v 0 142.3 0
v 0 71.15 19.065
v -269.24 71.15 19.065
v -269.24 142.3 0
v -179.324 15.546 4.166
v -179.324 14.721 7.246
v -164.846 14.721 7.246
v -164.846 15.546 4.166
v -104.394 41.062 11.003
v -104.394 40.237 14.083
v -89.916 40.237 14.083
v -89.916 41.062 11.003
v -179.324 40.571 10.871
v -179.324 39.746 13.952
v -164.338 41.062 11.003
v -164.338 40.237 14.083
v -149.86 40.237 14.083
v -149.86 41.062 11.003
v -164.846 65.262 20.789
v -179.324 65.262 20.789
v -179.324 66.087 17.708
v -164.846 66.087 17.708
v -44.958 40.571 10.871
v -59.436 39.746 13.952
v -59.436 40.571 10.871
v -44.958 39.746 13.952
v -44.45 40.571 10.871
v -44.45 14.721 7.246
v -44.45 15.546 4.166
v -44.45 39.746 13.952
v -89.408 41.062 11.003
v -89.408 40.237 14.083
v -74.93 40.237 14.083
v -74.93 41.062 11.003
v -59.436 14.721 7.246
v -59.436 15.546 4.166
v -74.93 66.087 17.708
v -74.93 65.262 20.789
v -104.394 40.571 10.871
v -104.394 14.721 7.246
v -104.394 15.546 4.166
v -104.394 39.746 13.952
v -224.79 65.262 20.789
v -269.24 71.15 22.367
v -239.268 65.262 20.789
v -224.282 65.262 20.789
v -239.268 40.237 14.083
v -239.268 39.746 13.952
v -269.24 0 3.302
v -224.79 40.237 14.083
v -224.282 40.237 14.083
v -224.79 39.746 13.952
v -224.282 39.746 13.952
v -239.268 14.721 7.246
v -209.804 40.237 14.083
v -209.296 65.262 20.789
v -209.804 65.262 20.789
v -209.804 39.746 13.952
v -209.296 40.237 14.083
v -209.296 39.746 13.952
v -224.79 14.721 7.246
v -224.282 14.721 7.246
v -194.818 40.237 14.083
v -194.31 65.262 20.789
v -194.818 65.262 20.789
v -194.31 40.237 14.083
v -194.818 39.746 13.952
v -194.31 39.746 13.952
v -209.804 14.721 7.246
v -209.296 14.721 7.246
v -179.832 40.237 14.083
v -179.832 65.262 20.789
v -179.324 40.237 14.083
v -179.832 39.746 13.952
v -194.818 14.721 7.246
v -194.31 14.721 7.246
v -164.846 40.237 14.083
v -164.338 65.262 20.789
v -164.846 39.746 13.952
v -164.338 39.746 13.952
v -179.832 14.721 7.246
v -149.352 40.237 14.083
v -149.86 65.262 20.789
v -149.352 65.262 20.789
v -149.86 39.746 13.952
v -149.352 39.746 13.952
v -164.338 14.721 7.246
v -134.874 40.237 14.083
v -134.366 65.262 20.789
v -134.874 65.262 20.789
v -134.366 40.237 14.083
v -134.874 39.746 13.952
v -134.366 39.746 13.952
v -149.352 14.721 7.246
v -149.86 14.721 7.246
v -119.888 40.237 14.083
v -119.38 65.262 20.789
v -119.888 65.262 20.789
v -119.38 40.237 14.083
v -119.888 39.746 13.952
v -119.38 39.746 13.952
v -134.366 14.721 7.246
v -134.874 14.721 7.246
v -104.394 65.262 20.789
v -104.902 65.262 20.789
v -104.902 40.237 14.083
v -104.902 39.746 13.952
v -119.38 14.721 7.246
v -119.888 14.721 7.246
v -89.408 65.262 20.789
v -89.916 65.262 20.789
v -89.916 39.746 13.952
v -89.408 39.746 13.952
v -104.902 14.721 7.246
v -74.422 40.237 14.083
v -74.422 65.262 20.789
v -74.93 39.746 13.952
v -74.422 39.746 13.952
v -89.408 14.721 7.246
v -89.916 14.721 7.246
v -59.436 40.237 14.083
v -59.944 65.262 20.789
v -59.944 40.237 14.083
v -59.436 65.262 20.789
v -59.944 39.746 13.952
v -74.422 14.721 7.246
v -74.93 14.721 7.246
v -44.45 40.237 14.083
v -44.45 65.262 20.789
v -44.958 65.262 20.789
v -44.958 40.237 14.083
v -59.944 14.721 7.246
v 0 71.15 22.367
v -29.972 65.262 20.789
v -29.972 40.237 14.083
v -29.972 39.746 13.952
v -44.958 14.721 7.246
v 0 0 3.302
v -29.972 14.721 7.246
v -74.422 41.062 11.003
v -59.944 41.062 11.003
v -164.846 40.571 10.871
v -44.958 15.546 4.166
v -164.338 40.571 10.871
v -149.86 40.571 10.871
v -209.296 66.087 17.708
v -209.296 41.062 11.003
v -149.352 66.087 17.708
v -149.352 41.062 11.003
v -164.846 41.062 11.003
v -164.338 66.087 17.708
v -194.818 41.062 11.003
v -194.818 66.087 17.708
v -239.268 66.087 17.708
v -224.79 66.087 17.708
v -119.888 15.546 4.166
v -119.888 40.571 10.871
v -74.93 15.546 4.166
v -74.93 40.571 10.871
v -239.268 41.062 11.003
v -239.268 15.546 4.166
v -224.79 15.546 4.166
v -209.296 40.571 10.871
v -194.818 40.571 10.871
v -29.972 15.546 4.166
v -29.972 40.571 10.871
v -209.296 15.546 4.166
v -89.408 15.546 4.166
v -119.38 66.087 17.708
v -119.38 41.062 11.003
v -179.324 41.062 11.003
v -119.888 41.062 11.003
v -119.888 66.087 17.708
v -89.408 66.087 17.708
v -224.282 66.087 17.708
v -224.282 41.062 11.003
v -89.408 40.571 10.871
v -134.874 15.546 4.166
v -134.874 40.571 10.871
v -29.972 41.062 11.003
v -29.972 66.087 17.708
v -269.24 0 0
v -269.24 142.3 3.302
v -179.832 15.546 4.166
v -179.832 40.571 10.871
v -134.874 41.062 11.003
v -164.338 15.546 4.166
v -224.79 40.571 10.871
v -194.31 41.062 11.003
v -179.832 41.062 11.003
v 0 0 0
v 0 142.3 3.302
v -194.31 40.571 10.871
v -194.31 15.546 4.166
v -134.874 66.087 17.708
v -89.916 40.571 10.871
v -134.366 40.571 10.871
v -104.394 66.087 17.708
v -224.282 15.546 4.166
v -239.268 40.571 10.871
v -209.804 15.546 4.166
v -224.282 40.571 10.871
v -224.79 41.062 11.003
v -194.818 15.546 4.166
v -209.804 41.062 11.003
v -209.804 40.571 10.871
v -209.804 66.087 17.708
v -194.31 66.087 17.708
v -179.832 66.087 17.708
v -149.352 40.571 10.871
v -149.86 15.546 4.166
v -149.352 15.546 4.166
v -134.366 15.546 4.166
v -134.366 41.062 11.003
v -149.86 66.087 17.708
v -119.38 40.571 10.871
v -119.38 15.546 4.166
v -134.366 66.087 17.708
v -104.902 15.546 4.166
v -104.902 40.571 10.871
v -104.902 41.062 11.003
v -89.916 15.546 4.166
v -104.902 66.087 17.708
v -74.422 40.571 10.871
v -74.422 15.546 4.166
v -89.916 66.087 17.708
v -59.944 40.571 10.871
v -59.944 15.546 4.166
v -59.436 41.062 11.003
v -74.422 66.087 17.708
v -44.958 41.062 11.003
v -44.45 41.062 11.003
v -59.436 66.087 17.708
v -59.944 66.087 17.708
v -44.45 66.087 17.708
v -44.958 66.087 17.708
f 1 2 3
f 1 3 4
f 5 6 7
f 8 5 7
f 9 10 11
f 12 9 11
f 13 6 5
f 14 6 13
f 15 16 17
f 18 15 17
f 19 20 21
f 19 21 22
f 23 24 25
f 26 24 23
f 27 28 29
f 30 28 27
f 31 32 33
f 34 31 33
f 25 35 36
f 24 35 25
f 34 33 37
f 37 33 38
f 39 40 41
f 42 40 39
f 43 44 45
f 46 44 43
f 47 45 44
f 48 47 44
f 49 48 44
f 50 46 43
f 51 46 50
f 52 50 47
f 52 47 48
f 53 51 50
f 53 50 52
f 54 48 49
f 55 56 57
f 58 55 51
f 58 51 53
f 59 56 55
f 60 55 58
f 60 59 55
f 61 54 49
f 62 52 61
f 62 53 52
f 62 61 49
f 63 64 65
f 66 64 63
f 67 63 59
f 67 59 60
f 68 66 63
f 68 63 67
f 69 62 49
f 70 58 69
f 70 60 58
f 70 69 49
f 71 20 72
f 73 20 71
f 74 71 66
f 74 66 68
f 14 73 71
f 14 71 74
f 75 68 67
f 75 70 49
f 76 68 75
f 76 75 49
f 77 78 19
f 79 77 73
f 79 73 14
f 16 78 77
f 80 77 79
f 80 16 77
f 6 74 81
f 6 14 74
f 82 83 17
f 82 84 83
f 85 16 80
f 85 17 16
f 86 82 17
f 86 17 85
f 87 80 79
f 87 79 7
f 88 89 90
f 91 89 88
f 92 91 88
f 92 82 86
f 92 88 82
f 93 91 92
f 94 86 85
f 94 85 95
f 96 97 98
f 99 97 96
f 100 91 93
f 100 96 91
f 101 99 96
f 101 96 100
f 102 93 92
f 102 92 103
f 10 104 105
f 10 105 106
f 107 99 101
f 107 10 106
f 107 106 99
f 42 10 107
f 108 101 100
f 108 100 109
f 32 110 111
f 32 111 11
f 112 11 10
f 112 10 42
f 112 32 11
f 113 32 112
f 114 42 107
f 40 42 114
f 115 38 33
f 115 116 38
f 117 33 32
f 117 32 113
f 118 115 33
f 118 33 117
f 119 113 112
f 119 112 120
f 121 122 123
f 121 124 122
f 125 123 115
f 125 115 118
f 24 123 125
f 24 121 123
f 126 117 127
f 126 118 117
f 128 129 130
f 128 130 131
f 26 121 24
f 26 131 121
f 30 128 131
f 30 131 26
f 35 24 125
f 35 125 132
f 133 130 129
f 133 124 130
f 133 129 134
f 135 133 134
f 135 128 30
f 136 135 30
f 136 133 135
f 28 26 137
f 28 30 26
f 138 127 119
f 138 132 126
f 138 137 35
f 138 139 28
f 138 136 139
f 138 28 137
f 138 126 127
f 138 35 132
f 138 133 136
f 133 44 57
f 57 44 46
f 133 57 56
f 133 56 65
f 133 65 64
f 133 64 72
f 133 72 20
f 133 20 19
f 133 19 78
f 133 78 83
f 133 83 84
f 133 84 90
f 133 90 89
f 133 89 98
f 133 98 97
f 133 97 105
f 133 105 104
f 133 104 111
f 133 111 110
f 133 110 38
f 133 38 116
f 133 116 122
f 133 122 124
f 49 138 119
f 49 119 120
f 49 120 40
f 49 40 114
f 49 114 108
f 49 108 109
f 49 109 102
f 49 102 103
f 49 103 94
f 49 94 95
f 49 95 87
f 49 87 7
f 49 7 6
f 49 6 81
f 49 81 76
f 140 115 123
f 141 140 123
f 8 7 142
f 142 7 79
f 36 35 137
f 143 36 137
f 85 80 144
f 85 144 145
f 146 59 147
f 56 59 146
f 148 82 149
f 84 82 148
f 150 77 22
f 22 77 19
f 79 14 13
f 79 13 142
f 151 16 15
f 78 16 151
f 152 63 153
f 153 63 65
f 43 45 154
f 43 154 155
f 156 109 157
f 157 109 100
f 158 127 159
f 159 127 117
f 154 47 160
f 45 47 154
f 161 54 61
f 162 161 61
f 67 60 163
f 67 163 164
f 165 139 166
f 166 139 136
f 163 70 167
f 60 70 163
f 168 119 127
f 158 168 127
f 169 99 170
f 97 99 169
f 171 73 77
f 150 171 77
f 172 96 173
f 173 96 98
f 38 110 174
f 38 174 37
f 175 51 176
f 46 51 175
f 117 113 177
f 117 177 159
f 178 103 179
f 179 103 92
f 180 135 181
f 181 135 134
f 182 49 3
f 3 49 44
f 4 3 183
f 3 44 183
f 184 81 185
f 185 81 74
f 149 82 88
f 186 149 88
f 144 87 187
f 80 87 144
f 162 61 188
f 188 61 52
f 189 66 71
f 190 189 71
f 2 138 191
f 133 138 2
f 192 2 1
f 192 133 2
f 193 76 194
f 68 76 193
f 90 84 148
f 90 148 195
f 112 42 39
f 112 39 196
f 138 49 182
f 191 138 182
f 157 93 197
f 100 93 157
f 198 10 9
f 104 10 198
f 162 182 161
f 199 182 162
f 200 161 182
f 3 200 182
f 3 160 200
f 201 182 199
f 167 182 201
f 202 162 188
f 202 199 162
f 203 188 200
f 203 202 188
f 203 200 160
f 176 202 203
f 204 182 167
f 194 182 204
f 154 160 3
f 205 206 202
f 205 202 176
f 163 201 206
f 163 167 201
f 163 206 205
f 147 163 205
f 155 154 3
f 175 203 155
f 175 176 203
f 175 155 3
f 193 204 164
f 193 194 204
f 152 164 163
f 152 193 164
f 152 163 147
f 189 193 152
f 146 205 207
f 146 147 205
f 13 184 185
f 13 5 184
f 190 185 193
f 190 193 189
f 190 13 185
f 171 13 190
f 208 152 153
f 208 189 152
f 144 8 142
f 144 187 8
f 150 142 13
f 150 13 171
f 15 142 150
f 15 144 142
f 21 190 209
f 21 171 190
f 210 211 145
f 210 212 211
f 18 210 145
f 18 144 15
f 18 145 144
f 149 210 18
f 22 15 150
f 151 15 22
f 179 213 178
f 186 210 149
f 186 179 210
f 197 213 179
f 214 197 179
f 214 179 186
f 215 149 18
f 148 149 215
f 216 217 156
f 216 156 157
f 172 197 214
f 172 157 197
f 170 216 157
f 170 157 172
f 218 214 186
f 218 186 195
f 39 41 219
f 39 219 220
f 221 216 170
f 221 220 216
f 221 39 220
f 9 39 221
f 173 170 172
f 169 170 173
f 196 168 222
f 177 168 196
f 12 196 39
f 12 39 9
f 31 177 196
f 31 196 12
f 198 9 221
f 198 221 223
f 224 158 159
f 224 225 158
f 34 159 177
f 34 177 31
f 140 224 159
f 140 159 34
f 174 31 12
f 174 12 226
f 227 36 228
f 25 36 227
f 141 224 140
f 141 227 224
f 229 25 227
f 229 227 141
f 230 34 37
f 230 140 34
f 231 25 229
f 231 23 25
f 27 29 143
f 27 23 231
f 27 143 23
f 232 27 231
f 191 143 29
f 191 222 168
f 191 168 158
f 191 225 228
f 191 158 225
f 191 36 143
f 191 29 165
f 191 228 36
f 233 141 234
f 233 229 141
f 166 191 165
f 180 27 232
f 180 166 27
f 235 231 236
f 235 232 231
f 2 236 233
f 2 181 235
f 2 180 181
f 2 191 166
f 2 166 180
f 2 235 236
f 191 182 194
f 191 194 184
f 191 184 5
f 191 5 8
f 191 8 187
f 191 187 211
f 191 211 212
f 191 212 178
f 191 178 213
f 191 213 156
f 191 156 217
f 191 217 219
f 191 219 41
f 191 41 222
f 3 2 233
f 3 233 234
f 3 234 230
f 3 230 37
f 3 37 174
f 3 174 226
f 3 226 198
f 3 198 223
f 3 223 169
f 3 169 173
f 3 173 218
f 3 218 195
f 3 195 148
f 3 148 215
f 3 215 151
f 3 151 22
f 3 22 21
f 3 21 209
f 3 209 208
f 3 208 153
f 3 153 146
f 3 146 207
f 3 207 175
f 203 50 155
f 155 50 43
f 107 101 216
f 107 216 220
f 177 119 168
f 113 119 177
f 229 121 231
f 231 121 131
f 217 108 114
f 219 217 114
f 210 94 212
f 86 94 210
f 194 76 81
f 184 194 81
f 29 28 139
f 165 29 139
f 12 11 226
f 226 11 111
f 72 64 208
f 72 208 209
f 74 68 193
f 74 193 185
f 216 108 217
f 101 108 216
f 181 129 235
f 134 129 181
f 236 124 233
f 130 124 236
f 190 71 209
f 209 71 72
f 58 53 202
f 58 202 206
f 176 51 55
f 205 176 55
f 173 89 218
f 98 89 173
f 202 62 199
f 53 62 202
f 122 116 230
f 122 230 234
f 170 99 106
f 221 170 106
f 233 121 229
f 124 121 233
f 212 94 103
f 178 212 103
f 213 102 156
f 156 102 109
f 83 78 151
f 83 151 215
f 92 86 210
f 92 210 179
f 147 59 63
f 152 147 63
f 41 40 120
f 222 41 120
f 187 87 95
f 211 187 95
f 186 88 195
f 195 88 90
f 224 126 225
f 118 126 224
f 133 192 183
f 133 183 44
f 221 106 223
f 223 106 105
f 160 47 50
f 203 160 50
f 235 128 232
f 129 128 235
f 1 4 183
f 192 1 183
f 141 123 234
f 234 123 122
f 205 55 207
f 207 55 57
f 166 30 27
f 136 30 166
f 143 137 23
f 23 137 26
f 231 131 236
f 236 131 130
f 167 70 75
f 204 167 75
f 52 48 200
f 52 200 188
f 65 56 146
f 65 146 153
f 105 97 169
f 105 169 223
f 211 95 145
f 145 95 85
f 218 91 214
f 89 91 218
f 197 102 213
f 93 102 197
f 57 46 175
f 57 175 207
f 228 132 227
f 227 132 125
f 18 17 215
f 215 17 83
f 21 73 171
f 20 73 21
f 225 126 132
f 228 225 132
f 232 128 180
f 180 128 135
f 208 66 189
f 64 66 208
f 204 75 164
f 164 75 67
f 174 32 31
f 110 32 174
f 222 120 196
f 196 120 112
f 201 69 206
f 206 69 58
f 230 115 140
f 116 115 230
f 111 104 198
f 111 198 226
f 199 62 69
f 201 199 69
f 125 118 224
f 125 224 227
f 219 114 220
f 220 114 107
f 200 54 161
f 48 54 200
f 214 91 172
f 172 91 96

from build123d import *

# Parameters (mm, degrees)
F1_DEPTH = 269.24
F2_W     = 14.478
F2_H     = 25.908
F3_DEPTH = 25.4


with BuildPart() as f1:
    # F0 (on Right) → F1 (new body)
    with BuildSketch(Plane.YZ):
        Polygon((0, 3.302), (0, 0), (71.1500963645, 19.0646108623), (142.3001927289, 0), (142.3001927289, 3.302), (71.1500963645, 22.3666108623), align=None)
    extrude(amount=-F1_DEPTH)

    # F2 (on face) → F3 (cut)
    with BuildSketch(Plane(origin=(0, -0.8255, 3.0808079416), x_dir=(1, 0, 0), z_dir=(0, -0.2588190451, 0.9659258263))):
        with Locations((-232.029, 55.4646204869)):
            Rectangle(F2_W, F2_H)
        with Locations((-232.029, 29.0486204869)):
            Rectangle(F2_W, F2_H)
        with Locations((-217.043, 55.4646204869)):
            Rectangle(F2_W, F2_H)
        with Locations((-217.043, 29.0486204869)):
            Rectangle(F2_W, F2_H)
        with Locations((-202.057, 55.4646204869)):
            Rectangle(F2_W, F2_H)
        with Locations((-202.057, 29.0486204869)):
            Rectangle(F2_W, F2_H)
        with Locations((-187.071, 55.4646204869)):
            Rectangle(F2_W, F2_H)
        with Locations((-187.071, 29.0486204869)):
            Rectangle(F2_W, F2_H)
        with Locations((-172.085, 55.4646204869)):
            Rectangle(F2_W, F2_H)
        with Locations((-172.085, 29.0486204869)):
            Rectangle(F2_W, F2_H)
        with Locations((-157.099, 55.4646204869)):
            Rectangle(F2_W, F2_H)
        with Locations((-157.099, 29.0486204869)):
            Rectangle(F2_W, F2_H)
        with Locations((-142.113, 55.4646204869)):
            Rectangle(F2_W, F2_H)
        with Locations((-142.113, 29.0486204869)):
            Rectangle(F2_W, F2_H)
        with Locations((-127.127, 55.4646204869)):
            Rectangle(F2_W, F2_H)
        with Locations((-127.127, 29.0486204869)):
            Rectangle(F2_W, F2_H)
        with Locations((-112.141, 55.4646204869)):
            Rectangle(F2_W, F2_H)
        with Locations((-112.141, 29.0486204869)):
            Rectangle(F2_W, F2_H)
        with Locations((-97.155, 55.4646204869)):
            Rectangle(F2_W, F2_H)
        with Locations((-97.155, 29.0486204869)):
            Rectangle(F2_W, F2_H)
        with Locations((-82.169, 55.4646204869)):
            Rectangle(F2_W, F2_H)
        with Locations((-82.169, 29.0486204869)):
            Rectangle(F2_W, F2_H)
        with Locations((-67.183, 55.4646204869)):
            Rectangle(F2_W, F2_H)
        with Locations((-67.183, 29.0486204869)):
            Rectangle(F2_W, F2_H)
        with Locations((-52.197, 55.4646204869)):
            Rectangle(F2_W, F2_H)
        with Locations((-52.197, 29.0486204869)):
            Rectangle(F2_W, F2_H)
        with Locations((-37.211, 55.4646204869)):
            Rectangle(F2_W, F2_H)
        with Locations((-37.211, 29.0486204869)):
            Rectangle(F2_W, F2_H)
    extrude(amount=-F3_DEPTH, mode=Mode.SUBTRACT)


solid = f1.part
